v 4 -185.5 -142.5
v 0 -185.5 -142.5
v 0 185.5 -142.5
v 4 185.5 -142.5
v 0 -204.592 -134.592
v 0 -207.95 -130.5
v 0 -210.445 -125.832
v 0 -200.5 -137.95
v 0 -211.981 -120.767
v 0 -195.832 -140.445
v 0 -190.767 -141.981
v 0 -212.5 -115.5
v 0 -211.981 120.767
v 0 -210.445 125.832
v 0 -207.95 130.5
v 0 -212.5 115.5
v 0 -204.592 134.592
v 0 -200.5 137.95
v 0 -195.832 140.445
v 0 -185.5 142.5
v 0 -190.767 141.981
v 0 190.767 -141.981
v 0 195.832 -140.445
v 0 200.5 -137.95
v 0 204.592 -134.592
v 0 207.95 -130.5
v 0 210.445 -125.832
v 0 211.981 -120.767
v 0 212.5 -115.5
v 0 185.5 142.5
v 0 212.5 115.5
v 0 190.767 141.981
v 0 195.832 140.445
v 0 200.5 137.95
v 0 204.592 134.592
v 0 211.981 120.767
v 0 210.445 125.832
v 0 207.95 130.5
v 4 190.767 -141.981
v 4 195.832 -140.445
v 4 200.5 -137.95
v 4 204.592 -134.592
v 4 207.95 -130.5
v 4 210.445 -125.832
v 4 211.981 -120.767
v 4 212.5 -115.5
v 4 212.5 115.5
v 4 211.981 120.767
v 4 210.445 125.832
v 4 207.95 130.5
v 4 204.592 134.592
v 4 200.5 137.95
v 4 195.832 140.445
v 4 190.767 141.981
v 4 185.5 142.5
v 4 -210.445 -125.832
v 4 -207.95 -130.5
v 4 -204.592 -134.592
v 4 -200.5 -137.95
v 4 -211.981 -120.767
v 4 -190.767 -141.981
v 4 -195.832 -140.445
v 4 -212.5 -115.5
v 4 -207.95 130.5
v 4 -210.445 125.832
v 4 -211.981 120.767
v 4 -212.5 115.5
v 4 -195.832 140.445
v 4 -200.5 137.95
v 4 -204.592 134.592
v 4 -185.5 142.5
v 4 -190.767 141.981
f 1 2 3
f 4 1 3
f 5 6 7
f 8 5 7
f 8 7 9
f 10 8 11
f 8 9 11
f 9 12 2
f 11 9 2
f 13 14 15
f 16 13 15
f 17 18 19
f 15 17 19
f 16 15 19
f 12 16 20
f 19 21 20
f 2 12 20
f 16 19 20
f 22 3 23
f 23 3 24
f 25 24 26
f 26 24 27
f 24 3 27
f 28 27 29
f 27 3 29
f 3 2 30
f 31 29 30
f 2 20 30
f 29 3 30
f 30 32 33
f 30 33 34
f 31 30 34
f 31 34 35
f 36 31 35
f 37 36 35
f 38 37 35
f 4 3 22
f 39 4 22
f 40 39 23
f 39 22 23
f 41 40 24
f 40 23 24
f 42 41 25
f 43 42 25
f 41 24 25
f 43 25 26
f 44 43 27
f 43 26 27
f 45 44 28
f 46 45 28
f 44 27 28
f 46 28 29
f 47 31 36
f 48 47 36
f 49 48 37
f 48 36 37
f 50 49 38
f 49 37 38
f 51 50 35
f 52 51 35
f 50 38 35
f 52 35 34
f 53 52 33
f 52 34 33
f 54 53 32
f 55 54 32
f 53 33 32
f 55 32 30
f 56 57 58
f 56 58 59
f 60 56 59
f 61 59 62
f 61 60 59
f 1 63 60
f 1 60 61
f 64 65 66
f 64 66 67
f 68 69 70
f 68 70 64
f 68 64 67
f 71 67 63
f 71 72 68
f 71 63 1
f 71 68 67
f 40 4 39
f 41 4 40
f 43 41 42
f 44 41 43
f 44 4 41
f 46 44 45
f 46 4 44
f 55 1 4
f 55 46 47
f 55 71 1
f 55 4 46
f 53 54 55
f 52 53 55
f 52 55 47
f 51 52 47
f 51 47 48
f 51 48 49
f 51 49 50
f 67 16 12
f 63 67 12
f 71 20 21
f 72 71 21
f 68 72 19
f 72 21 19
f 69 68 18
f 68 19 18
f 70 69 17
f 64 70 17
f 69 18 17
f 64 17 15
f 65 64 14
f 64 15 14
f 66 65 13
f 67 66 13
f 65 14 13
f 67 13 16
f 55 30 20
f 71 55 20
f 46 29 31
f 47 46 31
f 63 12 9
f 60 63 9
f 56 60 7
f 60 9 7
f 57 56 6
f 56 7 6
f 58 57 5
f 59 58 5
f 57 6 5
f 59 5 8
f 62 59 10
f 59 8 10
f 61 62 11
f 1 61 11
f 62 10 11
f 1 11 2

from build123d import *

# Parameters (mm, degrees)
PAD_DEPTH = 4


with BuildPart() as part:
    # Sketch → Pad (new body)
    with BuildSketch(Plane.YZ):
        with BuildLine():
            Line((-212.5, 115.5), (-212.5, -115.5))
            ThreePointArc((-212.5, -115.5), (-204.591883, -134.591883), (-185.5, -142.5))
            Line((-185.5, -142.5), (185.5, -142.5))
            ThreePointArc((185.5, -142.5), (204.591883, -134.591883), (212.5, -115.5))
            Line((212.5, -115.5), (212.5, 115.5))
            ThreePointArc((212.5, 115.5), (204.591883, 134.591883), (185.5, 142.5))
            Line((185.5, 142.5), (-185.5, 142.5))
            ThreePointArc((-185.5, 142.5), (-204.591883, 134.591883), (-212.5, 115.5))
        make_face()
    extrude(amount=PAD_DEPTH)


solid = part.part
